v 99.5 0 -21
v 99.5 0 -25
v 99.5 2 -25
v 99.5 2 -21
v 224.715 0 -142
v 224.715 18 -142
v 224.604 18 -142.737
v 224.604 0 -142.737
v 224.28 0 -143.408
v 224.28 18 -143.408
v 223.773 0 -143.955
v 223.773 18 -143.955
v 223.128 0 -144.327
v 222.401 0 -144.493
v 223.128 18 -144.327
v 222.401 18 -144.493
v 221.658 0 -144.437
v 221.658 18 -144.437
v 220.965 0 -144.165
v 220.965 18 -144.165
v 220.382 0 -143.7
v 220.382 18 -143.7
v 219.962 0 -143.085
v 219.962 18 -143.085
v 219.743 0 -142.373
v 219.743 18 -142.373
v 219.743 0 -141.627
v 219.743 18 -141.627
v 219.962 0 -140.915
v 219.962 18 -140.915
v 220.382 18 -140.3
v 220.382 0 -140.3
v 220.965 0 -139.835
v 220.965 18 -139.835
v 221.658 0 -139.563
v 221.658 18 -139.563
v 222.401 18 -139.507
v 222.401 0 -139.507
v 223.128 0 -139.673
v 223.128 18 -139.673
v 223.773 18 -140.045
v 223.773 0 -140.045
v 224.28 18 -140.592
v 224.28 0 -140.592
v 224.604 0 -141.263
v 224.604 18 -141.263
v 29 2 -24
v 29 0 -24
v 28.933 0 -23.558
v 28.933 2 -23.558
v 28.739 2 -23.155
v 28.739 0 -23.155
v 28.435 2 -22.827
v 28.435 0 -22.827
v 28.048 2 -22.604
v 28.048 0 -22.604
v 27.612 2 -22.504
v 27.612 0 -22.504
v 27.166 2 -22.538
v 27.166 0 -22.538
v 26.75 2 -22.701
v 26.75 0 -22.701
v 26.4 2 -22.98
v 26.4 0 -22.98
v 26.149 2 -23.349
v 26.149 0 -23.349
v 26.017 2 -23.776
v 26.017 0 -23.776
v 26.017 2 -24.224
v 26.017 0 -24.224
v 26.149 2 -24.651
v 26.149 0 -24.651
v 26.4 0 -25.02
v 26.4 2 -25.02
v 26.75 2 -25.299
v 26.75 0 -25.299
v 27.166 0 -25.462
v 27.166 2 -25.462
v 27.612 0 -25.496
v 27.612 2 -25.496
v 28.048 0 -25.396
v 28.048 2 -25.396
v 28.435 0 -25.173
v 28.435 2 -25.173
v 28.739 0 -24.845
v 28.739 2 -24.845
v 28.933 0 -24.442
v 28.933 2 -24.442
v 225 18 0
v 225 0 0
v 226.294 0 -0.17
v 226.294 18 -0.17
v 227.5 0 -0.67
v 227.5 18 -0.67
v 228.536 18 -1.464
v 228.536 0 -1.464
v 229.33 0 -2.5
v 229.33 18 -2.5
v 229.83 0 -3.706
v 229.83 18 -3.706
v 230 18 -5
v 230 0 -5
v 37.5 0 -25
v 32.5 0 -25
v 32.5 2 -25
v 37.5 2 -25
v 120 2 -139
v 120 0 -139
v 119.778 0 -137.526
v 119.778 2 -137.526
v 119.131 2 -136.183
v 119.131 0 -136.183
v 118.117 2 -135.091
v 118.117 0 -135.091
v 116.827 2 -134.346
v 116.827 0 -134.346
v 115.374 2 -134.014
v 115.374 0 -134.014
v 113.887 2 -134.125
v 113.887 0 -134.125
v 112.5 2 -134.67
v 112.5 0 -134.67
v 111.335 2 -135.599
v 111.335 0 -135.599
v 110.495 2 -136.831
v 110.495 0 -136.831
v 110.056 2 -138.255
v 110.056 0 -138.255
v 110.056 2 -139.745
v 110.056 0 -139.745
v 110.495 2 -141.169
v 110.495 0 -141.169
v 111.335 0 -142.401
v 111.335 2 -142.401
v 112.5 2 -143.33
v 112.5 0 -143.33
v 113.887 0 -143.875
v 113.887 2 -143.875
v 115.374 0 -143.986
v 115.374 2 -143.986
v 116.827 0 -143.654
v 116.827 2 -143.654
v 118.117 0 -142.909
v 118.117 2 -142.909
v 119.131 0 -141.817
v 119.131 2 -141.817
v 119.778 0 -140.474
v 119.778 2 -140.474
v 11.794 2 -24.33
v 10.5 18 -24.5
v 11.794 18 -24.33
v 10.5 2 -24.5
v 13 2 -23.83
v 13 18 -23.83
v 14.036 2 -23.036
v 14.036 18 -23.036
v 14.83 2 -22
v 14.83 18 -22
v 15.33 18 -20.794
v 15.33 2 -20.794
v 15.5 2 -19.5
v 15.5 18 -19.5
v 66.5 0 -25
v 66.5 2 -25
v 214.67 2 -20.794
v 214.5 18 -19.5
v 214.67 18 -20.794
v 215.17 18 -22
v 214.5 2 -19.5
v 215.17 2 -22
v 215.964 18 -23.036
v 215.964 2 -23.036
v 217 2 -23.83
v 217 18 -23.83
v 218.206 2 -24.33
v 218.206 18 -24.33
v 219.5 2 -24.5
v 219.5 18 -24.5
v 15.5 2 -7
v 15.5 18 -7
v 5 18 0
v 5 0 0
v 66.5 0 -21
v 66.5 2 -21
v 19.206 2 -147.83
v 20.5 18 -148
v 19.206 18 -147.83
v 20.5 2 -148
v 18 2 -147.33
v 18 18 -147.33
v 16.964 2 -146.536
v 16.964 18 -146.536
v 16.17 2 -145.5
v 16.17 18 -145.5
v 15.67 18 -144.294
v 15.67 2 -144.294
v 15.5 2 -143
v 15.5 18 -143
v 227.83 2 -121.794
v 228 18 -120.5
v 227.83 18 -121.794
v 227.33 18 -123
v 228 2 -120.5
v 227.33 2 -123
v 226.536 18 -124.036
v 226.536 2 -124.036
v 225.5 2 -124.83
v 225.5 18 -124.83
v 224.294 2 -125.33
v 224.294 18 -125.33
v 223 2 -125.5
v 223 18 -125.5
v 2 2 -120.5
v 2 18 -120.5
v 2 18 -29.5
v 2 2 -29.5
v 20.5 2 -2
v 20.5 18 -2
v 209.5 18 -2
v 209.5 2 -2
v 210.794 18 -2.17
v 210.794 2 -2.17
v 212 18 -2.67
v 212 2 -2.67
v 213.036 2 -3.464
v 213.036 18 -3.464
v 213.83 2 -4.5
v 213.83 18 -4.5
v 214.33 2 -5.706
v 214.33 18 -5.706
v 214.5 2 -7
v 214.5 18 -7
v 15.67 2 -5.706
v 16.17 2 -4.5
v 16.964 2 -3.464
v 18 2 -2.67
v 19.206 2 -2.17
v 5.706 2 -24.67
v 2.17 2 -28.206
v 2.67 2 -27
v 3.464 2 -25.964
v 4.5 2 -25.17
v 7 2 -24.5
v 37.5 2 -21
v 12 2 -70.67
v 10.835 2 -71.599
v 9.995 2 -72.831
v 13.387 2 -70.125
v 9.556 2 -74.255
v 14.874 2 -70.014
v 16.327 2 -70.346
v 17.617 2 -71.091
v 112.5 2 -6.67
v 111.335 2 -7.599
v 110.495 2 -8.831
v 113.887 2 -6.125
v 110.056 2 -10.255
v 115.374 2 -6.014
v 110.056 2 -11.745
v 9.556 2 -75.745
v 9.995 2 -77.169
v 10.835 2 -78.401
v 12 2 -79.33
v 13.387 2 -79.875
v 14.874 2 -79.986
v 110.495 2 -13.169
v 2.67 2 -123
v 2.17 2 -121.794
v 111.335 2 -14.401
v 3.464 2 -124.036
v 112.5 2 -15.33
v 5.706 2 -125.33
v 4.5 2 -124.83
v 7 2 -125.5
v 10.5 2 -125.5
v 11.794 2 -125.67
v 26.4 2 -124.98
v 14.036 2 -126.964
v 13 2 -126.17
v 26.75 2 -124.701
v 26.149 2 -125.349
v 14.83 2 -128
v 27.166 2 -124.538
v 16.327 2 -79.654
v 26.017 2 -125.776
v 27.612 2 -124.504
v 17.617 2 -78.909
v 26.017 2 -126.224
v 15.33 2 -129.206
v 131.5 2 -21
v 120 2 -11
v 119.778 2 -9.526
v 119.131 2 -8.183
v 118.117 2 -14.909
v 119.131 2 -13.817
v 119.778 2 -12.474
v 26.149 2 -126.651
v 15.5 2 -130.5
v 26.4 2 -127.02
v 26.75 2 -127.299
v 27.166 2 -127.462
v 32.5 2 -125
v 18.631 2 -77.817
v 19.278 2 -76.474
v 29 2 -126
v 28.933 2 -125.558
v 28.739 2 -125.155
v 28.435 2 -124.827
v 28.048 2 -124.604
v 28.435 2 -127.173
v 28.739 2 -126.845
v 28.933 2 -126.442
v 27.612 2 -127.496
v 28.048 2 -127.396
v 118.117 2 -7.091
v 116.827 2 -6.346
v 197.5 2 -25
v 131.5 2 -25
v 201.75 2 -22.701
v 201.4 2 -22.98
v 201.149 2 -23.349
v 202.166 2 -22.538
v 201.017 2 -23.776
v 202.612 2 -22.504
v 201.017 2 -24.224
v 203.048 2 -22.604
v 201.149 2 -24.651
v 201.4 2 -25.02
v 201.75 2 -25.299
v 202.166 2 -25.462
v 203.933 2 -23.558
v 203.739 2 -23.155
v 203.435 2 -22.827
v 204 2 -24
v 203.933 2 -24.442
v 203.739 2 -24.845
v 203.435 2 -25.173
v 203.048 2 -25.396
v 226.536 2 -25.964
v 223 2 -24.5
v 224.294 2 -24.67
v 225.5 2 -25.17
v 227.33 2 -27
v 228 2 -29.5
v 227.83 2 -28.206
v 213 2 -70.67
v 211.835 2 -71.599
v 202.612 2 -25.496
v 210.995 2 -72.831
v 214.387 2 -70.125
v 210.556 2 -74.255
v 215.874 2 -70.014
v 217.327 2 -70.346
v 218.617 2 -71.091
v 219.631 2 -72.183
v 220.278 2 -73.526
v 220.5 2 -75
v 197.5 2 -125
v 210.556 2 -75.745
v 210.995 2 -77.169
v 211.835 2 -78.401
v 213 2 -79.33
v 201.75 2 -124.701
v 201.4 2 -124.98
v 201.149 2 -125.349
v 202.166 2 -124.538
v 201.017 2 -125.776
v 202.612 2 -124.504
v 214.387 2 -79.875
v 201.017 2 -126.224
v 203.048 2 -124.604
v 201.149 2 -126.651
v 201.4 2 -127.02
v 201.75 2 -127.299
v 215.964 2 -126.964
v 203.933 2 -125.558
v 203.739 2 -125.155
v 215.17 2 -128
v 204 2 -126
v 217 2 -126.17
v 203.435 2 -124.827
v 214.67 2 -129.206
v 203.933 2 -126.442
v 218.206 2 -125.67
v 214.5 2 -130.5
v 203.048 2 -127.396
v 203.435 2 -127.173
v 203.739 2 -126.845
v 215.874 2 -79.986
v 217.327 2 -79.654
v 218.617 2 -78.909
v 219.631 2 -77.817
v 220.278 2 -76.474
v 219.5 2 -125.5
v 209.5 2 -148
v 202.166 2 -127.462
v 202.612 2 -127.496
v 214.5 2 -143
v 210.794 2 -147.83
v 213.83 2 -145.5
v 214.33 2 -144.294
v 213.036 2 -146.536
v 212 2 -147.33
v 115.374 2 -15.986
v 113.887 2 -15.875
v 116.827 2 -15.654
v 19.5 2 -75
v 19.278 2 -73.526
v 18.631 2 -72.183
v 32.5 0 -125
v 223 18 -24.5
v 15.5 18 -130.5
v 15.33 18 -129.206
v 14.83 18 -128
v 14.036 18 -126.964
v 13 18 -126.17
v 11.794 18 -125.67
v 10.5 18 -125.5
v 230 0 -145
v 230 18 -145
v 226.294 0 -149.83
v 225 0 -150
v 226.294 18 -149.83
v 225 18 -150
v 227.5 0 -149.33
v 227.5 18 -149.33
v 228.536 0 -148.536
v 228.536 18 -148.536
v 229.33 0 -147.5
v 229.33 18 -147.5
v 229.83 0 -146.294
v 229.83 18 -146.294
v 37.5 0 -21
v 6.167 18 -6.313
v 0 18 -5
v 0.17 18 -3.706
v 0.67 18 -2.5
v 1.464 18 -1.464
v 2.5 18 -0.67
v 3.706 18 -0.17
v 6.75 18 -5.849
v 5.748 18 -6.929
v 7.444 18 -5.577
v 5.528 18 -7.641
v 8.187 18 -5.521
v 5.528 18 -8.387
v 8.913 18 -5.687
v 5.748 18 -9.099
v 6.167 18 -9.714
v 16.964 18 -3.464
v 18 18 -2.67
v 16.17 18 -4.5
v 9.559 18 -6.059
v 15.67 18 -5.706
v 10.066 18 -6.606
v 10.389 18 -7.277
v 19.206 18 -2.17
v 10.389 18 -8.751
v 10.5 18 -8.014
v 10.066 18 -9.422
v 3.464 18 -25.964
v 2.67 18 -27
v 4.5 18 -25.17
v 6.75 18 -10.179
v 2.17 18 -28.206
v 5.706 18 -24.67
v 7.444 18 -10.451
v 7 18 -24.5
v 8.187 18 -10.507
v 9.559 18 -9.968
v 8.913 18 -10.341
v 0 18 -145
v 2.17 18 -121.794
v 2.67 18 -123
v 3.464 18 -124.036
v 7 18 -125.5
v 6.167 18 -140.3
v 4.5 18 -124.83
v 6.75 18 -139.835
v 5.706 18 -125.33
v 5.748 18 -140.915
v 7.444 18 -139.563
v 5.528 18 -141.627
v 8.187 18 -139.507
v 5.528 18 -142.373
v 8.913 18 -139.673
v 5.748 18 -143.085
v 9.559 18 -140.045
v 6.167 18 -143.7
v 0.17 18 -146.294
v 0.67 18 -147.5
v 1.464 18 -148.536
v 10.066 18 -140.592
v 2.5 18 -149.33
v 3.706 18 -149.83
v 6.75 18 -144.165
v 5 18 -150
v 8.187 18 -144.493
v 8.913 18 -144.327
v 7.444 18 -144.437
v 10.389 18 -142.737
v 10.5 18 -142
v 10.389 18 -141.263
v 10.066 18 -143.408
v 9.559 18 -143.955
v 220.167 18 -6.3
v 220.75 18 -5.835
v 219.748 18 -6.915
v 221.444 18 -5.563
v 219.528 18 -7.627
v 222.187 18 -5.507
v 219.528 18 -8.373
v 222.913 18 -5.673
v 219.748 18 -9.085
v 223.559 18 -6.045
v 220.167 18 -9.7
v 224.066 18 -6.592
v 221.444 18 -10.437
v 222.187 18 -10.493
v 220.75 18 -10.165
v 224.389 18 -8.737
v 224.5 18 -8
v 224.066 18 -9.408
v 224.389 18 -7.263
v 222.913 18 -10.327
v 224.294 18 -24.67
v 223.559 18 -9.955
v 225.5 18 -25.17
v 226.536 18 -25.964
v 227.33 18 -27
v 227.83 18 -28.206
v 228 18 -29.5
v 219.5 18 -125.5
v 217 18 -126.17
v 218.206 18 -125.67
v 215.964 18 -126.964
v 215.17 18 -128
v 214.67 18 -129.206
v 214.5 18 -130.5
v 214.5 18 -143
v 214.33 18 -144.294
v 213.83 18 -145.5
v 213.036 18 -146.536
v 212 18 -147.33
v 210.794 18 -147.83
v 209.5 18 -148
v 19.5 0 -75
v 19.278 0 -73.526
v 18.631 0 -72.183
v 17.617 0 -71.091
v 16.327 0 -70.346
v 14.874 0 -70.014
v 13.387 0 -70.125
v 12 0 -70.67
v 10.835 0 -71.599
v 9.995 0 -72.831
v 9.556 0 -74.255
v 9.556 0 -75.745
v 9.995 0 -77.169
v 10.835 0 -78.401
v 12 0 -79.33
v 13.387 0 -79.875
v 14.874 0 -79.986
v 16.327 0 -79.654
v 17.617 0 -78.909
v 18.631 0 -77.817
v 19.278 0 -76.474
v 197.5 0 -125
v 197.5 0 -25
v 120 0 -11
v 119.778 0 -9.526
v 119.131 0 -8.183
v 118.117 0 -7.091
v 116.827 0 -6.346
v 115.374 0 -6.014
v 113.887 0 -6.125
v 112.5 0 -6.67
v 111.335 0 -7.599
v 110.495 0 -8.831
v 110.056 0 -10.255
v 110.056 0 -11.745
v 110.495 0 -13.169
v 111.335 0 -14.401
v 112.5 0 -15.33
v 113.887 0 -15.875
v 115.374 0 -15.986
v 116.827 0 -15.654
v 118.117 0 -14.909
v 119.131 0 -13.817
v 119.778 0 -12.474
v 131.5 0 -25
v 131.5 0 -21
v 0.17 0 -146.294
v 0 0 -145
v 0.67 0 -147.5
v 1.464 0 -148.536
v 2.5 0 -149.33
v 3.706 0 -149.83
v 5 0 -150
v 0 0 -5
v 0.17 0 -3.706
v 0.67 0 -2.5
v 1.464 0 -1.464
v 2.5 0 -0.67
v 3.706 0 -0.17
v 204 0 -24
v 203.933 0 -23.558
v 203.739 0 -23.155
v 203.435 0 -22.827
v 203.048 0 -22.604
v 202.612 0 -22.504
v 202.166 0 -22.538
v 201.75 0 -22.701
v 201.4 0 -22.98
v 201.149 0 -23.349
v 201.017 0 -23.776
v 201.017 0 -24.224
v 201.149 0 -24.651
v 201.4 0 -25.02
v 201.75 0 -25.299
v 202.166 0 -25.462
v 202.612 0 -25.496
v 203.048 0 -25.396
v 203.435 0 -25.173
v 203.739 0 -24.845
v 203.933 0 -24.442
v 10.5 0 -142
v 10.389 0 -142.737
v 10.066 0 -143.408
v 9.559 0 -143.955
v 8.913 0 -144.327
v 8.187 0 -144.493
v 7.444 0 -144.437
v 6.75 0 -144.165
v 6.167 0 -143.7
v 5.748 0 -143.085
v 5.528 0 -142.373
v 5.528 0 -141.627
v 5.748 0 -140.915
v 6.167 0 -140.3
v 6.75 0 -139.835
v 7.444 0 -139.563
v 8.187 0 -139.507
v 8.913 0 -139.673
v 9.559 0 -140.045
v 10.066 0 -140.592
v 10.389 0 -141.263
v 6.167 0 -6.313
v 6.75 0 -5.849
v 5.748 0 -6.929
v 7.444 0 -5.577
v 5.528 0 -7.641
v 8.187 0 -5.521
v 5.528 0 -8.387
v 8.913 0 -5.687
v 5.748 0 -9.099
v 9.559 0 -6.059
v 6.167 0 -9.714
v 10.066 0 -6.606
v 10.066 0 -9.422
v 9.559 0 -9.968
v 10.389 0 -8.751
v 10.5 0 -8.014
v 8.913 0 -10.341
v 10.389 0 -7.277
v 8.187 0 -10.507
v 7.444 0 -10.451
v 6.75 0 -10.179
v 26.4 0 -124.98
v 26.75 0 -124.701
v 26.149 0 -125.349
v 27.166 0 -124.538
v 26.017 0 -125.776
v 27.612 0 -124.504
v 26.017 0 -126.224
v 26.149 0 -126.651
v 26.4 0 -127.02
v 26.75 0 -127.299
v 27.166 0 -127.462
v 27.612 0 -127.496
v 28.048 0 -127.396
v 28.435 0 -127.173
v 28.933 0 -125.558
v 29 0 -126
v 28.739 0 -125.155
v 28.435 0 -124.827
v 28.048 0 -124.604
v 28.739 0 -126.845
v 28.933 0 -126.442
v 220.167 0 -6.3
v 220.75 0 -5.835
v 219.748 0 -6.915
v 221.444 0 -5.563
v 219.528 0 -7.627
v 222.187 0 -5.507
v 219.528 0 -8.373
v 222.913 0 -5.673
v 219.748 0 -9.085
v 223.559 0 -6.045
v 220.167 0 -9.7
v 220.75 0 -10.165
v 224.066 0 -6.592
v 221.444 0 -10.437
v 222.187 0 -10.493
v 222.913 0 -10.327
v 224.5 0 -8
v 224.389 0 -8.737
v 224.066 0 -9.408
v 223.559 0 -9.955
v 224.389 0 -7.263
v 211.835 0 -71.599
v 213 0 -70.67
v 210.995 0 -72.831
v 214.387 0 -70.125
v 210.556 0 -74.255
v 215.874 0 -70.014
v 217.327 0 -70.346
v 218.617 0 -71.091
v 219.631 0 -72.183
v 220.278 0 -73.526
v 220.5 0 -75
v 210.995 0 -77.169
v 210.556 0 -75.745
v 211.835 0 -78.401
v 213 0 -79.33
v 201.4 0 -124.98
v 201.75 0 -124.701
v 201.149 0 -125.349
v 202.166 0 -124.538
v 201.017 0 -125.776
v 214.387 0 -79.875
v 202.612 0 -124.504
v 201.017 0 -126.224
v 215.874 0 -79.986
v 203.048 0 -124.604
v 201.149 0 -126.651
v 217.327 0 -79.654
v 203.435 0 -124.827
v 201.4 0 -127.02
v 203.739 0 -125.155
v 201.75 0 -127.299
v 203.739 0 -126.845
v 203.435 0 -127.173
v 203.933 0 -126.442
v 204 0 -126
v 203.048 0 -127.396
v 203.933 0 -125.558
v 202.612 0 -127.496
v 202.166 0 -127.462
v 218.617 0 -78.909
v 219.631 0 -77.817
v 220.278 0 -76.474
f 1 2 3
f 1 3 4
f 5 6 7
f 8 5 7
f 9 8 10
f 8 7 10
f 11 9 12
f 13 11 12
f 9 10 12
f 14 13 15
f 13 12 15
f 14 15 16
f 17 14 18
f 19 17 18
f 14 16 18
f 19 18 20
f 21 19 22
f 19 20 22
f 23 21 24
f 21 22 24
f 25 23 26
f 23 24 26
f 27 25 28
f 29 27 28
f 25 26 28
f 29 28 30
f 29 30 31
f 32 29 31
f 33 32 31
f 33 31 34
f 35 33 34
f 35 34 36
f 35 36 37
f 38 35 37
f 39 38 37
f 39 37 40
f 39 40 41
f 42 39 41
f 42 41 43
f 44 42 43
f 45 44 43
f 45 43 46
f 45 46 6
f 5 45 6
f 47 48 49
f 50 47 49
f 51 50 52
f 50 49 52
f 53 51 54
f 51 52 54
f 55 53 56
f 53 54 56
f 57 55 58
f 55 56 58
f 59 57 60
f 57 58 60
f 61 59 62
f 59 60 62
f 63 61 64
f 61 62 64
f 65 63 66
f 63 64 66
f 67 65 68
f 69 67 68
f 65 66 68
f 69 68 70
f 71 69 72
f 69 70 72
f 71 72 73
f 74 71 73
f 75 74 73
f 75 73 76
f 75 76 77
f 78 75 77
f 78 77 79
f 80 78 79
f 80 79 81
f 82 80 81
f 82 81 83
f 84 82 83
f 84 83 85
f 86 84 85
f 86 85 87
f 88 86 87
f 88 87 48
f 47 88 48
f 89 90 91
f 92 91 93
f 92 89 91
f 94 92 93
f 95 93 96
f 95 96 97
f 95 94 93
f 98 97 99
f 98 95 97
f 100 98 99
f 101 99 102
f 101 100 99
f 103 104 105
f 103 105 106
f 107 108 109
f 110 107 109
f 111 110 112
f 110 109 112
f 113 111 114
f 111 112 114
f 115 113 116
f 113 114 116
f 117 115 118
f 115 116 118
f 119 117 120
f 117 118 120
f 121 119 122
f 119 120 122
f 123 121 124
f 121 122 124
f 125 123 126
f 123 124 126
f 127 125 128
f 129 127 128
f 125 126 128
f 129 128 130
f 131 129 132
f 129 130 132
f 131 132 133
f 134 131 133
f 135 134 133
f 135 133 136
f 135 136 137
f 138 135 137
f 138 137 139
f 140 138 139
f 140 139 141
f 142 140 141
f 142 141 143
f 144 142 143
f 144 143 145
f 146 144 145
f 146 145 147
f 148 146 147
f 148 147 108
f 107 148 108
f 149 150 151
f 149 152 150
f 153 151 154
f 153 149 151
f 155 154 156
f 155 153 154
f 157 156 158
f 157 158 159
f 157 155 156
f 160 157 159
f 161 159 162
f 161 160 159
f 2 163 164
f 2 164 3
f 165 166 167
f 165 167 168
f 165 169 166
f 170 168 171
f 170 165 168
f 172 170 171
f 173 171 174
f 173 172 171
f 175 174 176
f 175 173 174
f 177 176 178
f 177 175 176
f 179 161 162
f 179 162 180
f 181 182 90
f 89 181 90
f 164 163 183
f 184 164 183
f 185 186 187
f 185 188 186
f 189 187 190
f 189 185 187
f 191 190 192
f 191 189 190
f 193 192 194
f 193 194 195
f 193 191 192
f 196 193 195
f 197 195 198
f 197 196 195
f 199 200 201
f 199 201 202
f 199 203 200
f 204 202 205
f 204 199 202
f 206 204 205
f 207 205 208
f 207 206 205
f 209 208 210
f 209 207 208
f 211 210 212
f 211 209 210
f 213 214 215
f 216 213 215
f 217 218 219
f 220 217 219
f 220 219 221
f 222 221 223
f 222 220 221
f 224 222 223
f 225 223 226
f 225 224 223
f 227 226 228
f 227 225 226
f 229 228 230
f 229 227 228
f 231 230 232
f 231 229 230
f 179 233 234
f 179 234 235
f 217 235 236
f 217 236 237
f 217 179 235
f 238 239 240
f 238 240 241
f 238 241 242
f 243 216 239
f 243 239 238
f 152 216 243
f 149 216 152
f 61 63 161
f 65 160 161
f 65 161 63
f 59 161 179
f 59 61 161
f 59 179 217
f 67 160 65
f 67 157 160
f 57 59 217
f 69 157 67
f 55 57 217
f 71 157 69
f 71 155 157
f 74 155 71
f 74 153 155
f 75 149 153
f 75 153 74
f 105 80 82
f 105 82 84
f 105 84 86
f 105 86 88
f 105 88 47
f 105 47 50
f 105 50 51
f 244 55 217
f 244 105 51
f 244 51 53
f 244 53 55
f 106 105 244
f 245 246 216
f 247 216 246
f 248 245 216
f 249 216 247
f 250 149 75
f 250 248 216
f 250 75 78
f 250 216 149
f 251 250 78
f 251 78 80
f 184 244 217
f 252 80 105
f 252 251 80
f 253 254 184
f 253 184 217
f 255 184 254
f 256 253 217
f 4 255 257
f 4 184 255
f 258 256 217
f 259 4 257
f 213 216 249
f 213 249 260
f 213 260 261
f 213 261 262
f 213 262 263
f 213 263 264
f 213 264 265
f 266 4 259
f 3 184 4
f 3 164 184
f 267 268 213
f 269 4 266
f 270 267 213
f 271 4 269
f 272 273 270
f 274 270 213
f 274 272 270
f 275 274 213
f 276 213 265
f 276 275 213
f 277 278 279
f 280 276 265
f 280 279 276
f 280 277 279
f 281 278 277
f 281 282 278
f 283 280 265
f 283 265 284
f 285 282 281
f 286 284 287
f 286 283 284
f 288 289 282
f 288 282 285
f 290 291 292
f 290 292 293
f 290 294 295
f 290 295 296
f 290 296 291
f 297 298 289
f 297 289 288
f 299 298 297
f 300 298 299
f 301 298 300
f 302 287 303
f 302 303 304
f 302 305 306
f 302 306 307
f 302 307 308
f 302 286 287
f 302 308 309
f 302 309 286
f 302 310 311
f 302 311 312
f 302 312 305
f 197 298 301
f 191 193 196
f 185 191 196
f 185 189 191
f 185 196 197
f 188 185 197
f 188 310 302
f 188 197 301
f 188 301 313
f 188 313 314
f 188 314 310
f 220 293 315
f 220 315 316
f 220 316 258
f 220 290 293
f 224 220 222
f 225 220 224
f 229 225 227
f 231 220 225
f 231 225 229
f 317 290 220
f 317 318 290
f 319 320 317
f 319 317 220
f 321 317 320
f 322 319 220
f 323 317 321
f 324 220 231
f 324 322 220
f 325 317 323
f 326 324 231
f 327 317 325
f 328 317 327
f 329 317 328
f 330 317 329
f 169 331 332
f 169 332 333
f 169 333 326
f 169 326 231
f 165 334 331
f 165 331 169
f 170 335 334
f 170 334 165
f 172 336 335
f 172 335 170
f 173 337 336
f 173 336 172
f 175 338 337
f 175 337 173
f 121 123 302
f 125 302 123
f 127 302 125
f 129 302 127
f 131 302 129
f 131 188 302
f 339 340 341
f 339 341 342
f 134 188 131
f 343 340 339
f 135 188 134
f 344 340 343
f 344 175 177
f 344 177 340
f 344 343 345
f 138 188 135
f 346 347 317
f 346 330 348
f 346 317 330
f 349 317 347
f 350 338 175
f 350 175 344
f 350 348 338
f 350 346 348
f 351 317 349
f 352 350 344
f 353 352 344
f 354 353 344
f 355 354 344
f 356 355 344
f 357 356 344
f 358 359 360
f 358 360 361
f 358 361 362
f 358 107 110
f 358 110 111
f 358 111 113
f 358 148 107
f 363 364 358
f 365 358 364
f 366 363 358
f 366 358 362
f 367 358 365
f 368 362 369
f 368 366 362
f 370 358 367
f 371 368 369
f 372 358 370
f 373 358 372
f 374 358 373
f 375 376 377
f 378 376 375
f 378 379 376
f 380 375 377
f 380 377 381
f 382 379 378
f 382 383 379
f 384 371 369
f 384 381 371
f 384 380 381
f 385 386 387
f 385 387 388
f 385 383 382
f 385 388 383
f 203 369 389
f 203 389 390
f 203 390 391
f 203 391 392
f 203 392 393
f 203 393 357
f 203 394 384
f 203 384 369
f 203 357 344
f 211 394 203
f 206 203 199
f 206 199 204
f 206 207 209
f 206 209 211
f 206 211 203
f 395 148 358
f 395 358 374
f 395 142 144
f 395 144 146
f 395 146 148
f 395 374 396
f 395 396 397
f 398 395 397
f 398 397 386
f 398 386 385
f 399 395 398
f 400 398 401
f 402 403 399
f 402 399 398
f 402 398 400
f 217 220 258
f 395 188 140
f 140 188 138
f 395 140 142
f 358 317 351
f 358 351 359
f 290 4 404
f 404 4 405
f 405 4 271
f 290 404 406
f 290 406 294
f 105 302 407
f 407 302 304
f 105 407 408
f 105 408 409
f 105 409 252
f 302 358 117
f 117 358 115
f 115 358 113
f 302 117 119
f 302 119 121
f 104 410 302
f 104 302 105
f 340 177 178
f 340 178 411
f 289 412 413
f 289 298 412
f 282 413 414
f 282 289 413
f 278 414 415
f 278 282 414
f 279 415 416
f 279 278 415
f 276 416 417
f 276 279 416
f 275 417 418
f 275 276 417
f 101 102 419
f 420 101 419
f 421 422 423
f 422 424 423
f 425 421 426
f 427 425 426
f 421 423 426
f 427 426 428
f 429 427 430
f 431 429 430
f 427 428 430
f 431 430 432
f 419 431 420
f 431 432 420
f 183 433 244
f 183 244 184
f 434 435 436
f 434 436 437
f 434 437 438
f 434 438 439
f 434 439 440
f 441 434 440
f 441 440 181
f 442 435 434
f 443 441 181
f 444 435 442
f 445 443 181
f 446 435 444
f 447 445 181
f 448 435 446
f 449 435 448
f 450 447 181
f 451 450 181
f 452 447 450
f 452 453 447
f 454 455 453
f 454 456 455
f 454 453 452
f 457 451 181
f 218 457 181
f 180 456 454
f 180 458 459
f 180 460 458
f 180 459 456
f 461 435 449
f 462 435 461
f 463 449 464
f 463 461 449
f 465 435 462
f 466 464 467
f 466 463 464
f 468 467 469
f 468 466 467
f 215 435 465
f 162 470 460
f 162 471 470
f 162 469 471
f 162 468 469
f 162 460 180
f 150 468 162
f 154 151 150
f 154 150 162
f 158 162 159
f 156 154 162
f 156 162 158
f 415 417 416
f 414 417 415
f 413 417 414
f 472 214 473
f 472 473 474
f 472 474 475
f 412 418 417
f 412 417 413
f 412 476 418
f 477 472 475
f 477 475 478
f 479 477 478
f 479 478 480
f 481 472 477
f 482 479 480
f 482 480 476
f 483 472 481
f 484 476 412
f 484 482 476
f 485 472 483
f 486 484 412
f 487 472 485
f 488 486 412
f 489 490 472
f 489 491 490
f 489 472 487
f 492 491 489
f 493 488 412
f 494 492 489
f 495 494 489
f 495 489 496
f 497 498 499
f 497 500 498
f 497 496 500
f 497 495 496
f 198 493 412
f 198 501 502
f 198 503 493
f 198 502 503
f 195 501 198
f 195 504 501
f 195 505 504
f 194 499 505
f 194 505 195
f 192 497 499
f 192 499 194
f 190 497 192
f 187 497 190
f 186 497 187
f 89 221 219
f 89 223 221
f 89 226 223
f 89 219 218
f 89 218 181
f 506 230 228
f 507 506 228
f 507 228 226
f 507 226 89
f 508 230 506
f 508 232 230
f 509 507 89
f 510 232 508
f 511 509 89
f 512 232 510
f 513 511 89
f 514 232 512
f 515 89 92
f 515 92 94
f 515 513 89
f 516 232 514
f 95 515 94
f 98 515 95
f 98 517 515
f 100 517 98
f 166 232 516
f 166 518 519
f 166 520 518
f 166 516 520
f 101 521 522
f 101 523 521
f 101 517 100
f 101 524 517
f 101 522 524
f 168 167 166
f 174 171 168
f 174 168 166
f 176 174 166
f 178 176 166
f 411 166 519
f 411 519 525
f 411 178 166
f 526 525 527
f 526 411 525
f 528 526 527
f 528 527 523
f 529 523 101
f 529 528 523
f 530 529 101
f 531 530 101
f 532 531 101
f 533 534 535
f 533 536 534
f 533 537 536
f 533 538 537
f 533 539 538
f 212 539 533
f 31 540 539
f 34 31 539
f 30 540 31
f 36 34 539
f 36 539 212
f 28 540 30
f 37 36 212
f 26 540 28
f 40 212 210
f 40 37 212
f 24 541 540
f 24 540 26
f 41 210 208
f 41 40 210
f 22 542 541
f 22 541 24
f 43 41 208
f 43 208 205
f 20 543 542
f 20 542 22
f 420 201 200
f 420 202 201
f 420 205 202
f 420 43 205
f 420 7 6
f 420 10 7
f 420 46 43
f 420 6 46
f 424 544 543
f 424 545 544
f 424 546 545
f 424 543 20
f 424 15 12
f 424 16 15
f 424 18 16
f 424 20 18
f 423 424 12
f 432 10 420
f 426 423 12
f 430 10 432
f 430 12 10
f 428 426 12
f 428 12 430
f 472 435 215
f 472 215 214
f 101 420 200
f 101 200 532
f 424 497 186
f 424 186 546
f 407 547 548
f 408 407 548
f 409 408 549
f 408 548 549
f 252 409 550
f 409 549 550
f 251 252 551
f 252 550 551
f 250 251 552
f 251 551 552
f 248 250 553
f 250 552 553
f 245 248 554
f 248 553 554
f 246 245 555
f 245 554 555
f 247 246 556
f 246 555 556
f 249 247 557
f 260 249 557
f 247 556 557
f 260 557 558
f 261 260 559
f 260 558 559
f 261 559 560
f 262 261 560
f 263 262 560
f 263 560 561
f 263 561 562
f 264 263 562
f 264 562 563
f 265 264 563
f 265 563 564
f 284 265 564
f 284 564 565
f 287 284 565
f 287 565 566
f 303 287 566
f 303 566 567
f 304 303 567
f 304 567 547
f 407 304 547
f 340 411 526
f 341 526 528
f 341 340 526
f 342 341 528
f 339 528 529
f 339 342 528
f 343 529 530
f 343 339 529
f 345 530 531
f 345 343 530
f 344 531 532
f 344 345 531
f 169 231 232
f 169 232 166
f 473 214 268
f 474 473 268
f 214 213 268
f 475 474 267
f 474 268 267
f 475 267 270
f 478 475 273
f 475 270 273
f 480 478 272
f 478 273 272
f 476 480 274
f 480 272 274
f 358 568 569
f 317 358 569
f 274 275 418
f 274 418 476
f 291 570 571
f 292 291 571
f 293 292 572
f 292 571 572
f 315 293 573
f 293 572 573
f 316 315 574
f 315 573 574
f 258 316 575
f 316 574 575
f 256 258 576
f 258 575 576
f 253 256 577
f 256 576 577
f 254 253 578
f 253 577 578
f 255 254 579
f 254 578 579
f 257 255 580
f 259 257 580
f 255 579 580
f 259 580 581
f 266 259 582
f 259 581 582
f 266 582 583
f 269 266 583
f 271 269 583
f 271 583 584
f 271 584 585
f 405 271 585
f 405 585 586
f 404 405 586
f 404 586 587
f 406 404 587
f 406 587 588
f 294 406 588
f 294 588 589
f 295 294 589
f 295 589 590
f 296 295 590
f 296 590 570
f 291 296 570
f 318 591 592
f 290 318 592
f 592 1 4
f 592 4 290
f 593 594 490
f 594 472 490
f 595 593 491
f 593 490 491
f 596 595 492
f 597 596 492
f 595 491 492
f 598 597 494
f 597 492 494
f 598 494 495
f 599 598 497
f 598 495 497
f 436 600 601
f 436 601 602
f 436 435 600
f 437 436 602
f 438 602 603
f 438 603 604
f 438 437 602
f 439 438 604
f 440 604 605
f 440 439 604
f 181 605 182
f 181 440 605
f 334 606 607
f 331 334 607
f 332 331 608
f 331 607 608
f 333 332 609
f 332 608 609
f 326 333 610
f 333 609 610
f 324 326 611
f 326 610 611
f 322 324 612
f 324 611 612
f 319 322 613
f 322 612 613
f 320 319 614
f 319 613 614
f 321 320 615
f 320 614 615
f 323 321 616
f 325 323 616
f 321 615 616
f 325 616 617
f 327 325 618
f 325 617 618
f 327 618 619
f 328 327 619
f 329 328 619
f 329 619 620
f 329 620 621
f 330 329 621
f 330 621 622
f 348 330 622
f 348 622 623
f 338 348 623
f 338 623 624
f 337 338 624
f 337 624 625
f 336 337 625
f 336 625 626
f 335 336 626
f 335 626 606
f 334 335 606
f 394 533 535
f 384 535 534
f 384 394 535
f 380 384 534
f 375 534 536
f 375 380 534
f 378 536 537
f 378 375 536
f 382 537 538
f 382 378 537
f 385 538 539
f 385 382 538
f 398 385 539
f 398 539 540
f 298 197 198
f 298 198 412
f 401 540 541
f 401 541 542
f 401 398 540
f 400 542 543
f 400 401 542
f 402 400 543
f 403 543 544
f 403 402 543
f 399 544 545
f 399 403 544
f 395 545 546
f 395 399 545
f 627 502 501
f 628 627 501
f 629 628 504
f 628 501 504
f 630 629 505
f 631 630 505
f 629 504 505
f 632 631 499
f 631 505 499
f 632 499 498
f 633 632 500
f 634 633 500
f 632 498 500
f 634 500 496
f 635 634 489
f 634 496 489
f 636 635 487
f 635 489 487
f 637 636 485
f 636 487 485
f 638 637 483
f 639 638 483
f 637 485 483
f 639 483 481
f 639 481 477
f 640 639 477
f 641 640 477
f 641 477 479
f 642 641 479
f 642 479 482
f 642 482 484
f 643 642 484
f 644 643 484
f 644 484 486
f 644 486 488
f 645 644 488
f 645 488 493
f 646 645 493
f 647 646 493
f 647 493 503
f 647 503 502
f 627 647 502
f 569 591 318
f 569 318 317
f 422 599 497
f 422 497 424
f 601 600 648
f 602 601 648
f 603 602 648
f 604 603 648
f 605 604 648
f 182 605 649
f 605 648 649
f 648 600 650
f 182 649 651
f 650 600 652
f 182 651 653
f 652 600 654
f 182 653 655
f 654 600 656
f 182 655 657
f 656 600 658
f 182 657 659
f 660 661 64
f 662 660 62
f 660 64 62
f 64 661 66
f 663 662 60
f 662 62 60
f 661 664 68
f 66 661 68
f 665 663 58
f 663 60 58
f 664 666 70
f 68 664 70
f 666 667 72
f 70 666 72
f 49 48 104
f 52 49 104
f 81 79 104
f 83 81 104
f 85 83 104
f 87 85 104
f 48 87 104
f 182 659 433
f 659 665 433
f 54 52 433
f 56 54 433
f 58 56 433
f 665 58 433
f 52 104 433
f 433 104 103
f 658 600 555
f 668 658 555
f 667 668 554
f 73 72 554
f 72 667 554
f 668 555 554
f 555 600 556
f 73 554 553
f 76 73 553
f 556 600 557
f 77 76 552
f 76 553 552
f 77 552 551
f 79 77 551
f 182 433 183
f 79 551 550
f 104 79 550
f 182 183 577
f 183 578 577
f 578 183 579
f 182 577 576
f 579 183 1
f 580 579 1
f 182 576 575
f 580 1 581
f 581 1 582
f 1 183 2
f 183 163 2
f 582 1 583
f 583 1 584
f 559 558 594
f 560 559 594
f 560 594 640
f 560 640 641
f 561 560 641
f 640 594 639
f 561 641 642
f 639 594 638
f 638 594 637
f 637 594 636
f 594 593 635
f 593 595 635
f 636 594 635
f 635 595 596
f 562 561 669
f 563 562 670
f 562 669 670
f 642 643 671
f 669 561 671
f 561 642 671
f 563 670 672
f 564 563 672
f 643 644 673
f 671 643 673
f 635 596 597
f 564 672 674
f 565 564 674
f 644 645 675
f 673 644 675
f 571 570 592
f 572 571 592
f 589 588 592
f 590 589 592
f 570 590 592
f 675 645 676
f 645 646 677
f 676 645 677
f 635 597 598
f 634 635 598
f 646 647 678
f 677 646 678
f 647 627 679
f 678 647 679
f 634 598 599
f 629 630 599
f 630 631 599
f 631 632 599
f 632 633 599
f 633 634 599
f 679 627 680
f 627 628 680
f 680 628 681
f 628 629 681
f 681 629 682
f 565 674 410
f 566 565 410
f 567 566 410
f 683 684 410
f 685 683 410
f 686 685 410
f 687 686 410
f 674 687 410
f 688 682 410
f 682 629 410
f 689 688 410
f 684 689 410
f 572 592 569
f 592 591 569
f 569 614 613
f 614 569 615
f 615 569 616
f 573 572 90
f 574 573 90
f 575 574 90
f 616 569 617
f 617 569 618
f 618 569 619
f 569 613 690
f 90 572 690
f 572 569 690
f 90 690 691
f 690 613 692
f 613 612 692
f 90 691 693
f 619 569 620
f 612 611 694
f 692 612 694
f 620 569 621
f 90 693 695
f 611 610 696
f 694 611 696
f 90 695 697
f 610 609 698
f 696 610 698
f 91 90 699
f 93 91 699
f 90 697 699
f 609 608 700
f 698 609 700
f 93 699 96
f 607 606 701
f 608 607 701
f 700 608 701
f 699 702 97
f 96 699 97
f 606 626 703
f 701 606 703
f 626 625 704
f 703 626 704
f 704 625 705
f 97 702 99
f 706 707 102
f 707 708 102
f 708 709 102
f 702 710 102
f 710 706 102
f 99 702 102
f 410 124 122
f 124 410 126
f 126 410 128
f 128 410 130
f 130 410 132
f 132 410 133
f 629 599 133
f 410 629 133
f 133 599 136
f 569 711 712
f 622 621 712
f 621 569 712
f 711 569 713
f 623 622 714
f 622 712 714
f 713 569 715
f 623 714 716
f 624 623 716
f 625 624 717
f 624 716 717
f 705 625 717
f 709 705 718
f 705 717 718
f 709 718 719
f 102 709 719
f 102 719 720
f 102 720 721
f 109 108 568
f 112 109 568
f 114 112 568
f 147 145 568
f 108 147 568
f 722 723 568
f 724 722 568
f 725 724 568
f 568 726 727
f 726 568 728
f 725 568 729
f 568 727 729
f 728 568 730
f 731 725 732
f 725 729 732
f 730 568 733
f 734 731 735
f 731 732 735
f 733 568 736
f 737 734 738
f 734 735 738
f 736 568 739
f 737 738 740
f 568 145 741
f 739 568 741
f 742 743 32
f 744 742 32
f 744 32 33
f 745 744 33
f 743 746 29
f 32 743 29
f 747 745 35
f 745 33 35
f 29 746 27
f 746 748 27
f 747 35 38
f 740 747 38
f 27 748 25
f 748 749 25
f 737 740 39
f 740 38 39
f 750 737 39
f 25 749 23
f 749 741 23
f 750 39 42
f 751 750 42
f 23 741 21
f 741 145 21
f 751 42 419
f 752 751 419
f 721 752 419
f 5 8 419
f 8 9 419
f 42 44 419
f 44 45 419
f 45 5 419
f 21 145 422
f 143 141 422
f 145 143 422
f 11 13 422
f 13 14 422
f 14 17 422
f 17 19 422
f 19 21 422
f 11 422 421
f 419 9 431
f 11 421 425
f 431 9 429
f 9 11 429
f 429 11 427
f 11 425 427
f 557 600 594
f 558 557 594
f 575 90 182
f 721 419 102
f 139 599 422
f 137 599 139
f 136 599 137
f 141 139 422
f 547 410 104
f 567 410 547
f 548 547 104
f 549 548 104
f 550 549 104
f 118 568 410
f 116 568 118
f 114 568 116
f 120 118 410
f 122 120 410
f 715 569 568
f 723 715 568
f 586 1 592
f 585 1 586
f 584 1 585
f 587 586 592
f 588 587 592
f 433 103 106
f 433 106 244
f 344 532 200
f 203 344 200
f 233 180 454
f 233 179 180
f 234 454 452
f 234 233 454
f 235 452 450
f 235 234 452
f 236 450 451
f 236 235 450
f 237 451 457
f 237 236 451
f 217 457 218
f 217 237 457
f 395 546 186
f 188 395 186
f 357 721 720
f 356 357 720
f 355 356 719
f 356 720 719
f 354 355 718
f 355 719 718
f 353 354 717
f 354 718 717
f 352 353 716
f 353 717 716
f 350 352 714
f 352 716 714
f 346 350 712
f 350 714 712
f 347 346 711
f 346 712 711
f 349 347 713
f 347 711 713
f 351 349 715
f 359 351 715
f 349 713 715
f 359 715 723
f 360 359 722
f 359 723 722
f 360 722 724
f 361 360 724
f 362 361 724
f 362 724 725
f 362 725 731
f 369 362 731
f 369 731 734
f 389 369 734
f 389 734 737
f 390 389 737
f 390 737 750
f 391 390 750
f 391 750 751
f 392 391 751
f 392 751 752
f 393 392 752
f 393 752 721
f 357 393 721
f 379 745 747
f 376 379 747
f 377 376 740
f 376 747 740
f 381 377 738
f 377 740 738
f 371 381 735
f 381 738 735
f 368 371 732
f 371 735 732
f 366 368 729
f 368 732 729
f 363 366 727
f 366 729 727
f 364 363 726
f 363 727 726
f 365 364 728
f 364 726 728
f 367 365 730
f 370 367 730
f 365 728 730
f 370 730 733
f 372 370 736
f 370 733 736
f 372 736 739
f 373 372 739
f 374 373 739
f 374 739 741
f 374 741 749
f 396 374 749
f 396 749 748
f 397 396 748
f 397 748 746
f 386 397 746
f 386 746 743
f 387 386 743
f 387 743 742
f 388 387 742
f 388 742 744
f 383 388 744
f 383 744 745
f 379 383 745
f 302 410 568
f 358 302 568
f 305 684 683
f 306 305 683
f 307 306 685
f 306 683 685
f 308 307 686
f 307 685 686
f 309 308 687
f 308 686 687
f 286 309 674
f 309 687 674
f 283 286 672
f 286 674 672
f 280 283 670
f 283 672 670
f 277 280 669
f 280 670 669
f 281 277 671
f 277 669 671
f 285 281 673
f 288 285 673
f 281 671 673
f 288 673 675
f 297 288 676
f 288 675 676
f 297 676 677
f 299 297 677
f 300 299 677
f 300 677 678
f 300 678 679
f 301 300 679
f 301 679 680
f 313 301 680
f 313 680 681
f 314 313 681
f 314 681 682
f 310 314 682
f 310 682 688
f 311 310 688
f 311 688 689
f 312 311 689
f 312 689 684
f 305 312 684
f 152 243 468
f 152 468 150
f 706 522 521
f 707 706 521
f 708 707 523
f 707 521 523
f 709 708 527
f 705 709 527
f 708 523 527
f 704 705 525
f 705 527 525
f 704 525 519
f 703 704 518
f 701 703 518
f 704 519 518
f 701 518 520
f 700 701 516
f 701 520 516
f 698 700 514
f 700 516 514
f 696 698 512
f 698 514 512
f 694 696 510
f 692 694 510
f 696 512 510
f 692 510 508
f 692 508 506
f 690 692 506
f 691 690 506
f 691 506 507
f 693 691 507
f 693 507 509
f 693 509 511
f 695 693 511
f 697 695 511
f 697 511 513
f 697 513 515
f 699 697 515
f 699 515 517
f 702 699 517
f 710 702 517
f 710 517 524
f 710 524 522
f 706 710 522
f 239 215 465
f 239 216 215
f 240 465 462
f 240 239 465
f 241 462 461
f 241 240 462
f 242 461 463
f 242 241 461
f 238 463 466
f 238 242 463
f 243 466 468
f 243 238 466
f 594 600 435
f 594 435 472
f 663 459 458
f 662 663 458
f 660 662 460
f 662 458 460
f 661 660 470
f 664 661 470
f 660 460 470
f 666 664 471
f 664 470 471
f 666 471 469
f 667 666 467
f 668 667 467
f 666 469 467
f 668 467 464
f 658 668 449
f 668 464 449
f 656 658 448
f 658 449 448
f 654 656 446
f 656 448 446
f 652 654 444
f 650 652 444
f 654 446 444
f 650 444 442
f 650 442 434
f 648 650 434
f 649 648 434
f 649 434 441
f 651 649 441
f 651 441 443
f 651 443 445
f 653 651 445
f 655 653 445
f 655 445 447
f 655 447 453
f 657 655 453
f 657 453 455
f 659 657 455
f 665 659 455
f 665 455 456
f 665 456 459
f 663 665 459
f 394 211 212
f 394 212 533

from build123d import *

# Parameters (mm, degrees)
SKETCH_1_W                       = 230
SKETCH_1_H                       = 150
EXTRUDE_1_DEPTH                  = 18
CUT_EXTRUDE_2_DEPTH              = 16
FILLET_1_R                       = 5
SKETCH_3_R                       = 2.5
CUT_EXTRUDE_4_DEPTH              = 19
SKETCH_5_W                       = 165
SKETCH_5_H                       = 100
CUT_EXTRUDE_5_DEPTH              = 19
CUT_EXTRUDE_8_REACH              = 20
SKETCH_7_R                       = 1.5
CUT_EXTRUDE_9_REACH              = 20
SKETCH_8_R                       = 5
CUT_EXTRUDE_10_REACH             = 20
SKETCH_6_W                       = 29
SKETCH_6_H                       = 4
CUT_EXTRUDE_11_REACH             = 20
SKETCH_6_3_W                     = 32
SKETCH_6_3_H                     = 4
CUT_EXTRUDE_11_DIRECTION_2_DEPTH = 1


with BuildPart() as part:
    # 草图1 → 凸台-拉伸1 (new body)
    with BuildSketch(Plane(origin=(0, 0, 0), x_dir=(1, 0, 0), z_dir=(0, 1, 0))):
        with Locations((115, 75)):
            Rectangle(SKETCH_1_W, SKETCH_1_H)
    extrude(amount=EXTRUDE_1_DEPTH)

    # 草图2 → 切除-拉伸2 (cut)
    with BuildSketch(Plane(origin=(0, 18, 0), x_dir=(1, 0, 0), z_dir=(0, 1, 0))):
        Polygon((2, 125.5), (2, 24.5), (15.5, 24.5), (15.5, 2), (214.5, 2), (214.5, 24.5), (228, 24.5), (228, 125.5), (214.5, 125.5), (214.5, 148), (15.5, 148), (15.5, 125.5), align=None)
    extrude(amount=-CUT_EXTRUDE_2_DEPTH, mode=Mode.SUBTRACT)

    # 圆角1
    fillet_1_edges = [part.edges().sort_by_distance(p)[0] for p in [
        (2, 10, -125.5),
        (15.5, 10, -125.5),
        (15.5, 10, -148),
        (214.5, 10, -148),
        (214.5, 10, -125.5),
        (228, 10, -125.5),
        (228, 10, -24.5),
        (214.5, 10, -24.5),
        (214.5, 10, -2),
        (15.5, 10, -2),
        (15.5, 10, -24.5),
        (2, 10, -24.5),
        (0, 9, -150),
        (230, 9, -150),
        (230, 9, 0),
        (0, 9, 0),
    ]]
    fillet(fillet_1_edges, radius=FILLET_1_R)

    # 草图3 → 切除-拉伸4 (cut, through all)
    with BuildSketch(Plane(origin=(0, 18, 0), x_dir=(1, 0, 0), z_dir=(0, 1, 0))):
        with Locations((8, 142)):
            Circle(SKETCH_3_R)
        with Locations((222.21463853, 142)):
            Circle(SKETCH_3_R)
        with Locations((8, 8.013915663)):
            Circle(SKETCH_3_R)
        with Locations((222, 8)):
            Circle(SKETCH_3_R)
    extrude(amount=-CUT_EXTRUDE_4_DEPTH, mode=Mode.SUBTRACT)

    # 草图5 → 切除-拉伸5 (cut, through all)
    with BuildSketch(Plane.XZ):
        with Locations((115, -75)):
            Rectangle(SKETCH_5_W, SKETCH_5_H)
    extrude(amount=-CUT_EXTRUDE_5_DEPTH, mode=Mode.SUBTRACT)

    # 草图7 → 切除-拉伸8 (cut, up to next)
    with BuildSketch(Plane.XZ, mode=Mode.PRIVATE) as cut_extrude_8_sk1:
        with Locations((27.5, -24)):
            Circle(SKETCH_7_R)
    cut_extrude_8_tool1 = extrude(cut_extrude_8_sk1.sketch, amount=-CUT_EXTRUDE_8_REACH, mode=Mode.PRIVATE) & part.part
    add(cut_extrude_8_tool1.solids().sort_by_distance((27.5, 0, -24))[0], mode=Mode.SUBTRACT)
    # 草图7 → 切除-拉伸8 (cut, up to next)
    with BuildSketch(Plane.XZ, mode=Mode.PRIVATE) as cut_extrude_8_sk2:
        with Locations((202.5, -126)):
            Circle(SKETCH_7_R)
    cut_extrude_8_tool2 = extrude(cut_extrude_8_sk2.sketch, amount=-CUT_EXTRUDE_8_REACH, mode=Mode.PRIVATE) & part.part
    add(cut_extrude_8_tool2.solids().sort_by_distance((202.5, 0, -126))[0], mode=Mode.SUBTRACT)
    # 草图7 → 切除-拉伸8 (cut, up to next)
    with BuildSketch(Plane.XZ, mode=Mode.PRIVATE) as cut_extrude_8_sk3:
        with Locations((27.5, -126)):
            Circle(SKETCH_7_R)
    cut_extrude_8_tool3 = extrude(cut_extrude_8_sk3.sketch, amount=-CUT_EXTRUDE_8_REACH, mode=Mode.PRIVATE) & part.part
    add(cut_extrude_8_tool3.solids().sort_by_distance((27.5, 0, -126))[0], mode=Mode.SUBTRACT)
    # 草图7 → 切除-拉伸8 (cut, up to next)
    with BuildSketch(Plane.XZ, mode=Mode.PRIVATE) as cut_extrude_8_sk4:
        with Locations((202.5, -24)):
            Circle(SKETCH_7_R)
    cut_extrude_8_tool4 = extrude(cut_extrude_8_sk4.sketch, amount=-CUT_EXTRUDE_8_REACH, mode=Mode.PRIVATE) & part.part
    add(cut_extrude_8_tool4.solids().sort_by_distance((202.5, 0, -24))[0], mode=Mode.SUBTRACT)

    # 草图8 → 切除-拉伸9 (cut, up to next)
    with BuildSketch(Plane.XZ, mode=Mode.PRIVATE) as cut_extrude_9_sk1:
        with Locations((14.5, -75)):
            Circle(SKETCH_8_R)
    cut_extrude_9_tool1 = extrude(cut_extrude_9_sk1.sketch, amount=-CUT_EXTRUDE_9_REACH, mode=Mode.PRIVATE) & part.part
    add(cut_extrude_9_tool1.solids().sort_by_distance((14.5, 0, -75))[0], mode=Mode.SUBTRACT)
    # 草图8 → 切除-拉伸9 (cut, up to next)
    with BuildSketch(Plane.XZ, mode=Mode.PRIVATE) as cut_extrude_9_sk2:
        with Locations((115, -11)):
            Circle(SKETCH_8_R)
    cut_extrude_9_tool2 = extrude(cut_extrude_9_sk2.sketch, amount=-CUT_EXTRUDE_9_REACH, mode=Mode.PRIVATE) & part.part
    add(cut_extrude_9_tool2.solids().sort_by_distance((115, 0, -11))[0], mode=Mode.SUBTRACT)
    # 草图8 → 切除-拉伸9 (cut, up to next)
    with BuildSketch(Plane.XZ, mode=Mode.PRIVATE) as cut_extrude_9_sk3:
        with Locations((215.5, -75)):
            Circle(SKETCH_8_R)
    cut_extrude_9_tool3 = extrude(cut_extrude_9_sk3.sketch, amount=-CUT_EXTRUDE_9_REACH, mode=Mode.PRIVATE) & part.part
    add(cut_extrude_9_tool3.solids().sort_by_distance((215.5, 0, -75))[0], mode=Mode.SUBTRACT)
    # 草图8 → 切除-拉伸9 (cut, up to next)
    with BuildSketch(Plane.XZ, mode=Mode.PRIVATE) as cut_extrude_9_sk4:
        with Locations((115, -139)):
            Circle(SKETCH_8_R)
    cut_extrude_9_tool4 = extrude(cut_extrude_9_sk4.sketch, amount=-CUT_EXTRUDE_9_REACH, mode=Mode.PRIVATE) & part.part
    add(cut_extrude_9_tool4.solids().sort_by_distance((115, 0, -139))[0], mode=Mode.SUBTRACT)

    # 草图6 → 切除-拉伸10 (cut, up to next)
    with BuildSketch(Plane.XZ, mode=Mode.PRIVATE) as cut_extrude_10_sk1:
        with Locations((52, -23)):
            Rectangle(SKETCH_6_W, SKETCH_6_H)
    cut_extrude_10_tool1 = extrude(cut_extrude_10_sk1.sketch, amount=-CUT_EXTRUDE_10_REACH, mode=Mode.PRIVATE) & part.part
    add(cut_extrude_10_tool1.solids().sort_by_distance((52, 0, -23))[0], mode=Mode.SUBTRACT)

    # 草图6<3> → 切除-拉伸11 (cut, up to next)
    with BuildSketch(Plane.XZ, mode=Mode.PRIVATE) as cut_extrude_11_sk1:
        with Locations((115.5, -23)):
            Rectangle(SKETCH_6_3_W, SKETCH_6_3_H)
    cut_extrude_11_tool1 = extrude(cut_extrude_11_sk1.sketch, amount=-CUT_EXTRUDE_11_REACH, mode=Mode.PRIVATE) & part.part
    add(cut_extrude_11_tool1.solids().sort_by_distance((115.5, 0, -23))[0], mode=Mode.SUBTRACT)

    # 草图6<3> → 切除-拉伸11 direction 2 (cut)
    with BuildSketch(Plane.XZ):
        with Locations((115.5, -23)):
            Rectangle(SKETCH_6_3_W, SKETCH_6_3_H)
    extrude(amount=CUT_EXTRUDE_11_DIRECTION_2_DEPTH, mode=Mode.SUBTRACT)


solid = part.part
